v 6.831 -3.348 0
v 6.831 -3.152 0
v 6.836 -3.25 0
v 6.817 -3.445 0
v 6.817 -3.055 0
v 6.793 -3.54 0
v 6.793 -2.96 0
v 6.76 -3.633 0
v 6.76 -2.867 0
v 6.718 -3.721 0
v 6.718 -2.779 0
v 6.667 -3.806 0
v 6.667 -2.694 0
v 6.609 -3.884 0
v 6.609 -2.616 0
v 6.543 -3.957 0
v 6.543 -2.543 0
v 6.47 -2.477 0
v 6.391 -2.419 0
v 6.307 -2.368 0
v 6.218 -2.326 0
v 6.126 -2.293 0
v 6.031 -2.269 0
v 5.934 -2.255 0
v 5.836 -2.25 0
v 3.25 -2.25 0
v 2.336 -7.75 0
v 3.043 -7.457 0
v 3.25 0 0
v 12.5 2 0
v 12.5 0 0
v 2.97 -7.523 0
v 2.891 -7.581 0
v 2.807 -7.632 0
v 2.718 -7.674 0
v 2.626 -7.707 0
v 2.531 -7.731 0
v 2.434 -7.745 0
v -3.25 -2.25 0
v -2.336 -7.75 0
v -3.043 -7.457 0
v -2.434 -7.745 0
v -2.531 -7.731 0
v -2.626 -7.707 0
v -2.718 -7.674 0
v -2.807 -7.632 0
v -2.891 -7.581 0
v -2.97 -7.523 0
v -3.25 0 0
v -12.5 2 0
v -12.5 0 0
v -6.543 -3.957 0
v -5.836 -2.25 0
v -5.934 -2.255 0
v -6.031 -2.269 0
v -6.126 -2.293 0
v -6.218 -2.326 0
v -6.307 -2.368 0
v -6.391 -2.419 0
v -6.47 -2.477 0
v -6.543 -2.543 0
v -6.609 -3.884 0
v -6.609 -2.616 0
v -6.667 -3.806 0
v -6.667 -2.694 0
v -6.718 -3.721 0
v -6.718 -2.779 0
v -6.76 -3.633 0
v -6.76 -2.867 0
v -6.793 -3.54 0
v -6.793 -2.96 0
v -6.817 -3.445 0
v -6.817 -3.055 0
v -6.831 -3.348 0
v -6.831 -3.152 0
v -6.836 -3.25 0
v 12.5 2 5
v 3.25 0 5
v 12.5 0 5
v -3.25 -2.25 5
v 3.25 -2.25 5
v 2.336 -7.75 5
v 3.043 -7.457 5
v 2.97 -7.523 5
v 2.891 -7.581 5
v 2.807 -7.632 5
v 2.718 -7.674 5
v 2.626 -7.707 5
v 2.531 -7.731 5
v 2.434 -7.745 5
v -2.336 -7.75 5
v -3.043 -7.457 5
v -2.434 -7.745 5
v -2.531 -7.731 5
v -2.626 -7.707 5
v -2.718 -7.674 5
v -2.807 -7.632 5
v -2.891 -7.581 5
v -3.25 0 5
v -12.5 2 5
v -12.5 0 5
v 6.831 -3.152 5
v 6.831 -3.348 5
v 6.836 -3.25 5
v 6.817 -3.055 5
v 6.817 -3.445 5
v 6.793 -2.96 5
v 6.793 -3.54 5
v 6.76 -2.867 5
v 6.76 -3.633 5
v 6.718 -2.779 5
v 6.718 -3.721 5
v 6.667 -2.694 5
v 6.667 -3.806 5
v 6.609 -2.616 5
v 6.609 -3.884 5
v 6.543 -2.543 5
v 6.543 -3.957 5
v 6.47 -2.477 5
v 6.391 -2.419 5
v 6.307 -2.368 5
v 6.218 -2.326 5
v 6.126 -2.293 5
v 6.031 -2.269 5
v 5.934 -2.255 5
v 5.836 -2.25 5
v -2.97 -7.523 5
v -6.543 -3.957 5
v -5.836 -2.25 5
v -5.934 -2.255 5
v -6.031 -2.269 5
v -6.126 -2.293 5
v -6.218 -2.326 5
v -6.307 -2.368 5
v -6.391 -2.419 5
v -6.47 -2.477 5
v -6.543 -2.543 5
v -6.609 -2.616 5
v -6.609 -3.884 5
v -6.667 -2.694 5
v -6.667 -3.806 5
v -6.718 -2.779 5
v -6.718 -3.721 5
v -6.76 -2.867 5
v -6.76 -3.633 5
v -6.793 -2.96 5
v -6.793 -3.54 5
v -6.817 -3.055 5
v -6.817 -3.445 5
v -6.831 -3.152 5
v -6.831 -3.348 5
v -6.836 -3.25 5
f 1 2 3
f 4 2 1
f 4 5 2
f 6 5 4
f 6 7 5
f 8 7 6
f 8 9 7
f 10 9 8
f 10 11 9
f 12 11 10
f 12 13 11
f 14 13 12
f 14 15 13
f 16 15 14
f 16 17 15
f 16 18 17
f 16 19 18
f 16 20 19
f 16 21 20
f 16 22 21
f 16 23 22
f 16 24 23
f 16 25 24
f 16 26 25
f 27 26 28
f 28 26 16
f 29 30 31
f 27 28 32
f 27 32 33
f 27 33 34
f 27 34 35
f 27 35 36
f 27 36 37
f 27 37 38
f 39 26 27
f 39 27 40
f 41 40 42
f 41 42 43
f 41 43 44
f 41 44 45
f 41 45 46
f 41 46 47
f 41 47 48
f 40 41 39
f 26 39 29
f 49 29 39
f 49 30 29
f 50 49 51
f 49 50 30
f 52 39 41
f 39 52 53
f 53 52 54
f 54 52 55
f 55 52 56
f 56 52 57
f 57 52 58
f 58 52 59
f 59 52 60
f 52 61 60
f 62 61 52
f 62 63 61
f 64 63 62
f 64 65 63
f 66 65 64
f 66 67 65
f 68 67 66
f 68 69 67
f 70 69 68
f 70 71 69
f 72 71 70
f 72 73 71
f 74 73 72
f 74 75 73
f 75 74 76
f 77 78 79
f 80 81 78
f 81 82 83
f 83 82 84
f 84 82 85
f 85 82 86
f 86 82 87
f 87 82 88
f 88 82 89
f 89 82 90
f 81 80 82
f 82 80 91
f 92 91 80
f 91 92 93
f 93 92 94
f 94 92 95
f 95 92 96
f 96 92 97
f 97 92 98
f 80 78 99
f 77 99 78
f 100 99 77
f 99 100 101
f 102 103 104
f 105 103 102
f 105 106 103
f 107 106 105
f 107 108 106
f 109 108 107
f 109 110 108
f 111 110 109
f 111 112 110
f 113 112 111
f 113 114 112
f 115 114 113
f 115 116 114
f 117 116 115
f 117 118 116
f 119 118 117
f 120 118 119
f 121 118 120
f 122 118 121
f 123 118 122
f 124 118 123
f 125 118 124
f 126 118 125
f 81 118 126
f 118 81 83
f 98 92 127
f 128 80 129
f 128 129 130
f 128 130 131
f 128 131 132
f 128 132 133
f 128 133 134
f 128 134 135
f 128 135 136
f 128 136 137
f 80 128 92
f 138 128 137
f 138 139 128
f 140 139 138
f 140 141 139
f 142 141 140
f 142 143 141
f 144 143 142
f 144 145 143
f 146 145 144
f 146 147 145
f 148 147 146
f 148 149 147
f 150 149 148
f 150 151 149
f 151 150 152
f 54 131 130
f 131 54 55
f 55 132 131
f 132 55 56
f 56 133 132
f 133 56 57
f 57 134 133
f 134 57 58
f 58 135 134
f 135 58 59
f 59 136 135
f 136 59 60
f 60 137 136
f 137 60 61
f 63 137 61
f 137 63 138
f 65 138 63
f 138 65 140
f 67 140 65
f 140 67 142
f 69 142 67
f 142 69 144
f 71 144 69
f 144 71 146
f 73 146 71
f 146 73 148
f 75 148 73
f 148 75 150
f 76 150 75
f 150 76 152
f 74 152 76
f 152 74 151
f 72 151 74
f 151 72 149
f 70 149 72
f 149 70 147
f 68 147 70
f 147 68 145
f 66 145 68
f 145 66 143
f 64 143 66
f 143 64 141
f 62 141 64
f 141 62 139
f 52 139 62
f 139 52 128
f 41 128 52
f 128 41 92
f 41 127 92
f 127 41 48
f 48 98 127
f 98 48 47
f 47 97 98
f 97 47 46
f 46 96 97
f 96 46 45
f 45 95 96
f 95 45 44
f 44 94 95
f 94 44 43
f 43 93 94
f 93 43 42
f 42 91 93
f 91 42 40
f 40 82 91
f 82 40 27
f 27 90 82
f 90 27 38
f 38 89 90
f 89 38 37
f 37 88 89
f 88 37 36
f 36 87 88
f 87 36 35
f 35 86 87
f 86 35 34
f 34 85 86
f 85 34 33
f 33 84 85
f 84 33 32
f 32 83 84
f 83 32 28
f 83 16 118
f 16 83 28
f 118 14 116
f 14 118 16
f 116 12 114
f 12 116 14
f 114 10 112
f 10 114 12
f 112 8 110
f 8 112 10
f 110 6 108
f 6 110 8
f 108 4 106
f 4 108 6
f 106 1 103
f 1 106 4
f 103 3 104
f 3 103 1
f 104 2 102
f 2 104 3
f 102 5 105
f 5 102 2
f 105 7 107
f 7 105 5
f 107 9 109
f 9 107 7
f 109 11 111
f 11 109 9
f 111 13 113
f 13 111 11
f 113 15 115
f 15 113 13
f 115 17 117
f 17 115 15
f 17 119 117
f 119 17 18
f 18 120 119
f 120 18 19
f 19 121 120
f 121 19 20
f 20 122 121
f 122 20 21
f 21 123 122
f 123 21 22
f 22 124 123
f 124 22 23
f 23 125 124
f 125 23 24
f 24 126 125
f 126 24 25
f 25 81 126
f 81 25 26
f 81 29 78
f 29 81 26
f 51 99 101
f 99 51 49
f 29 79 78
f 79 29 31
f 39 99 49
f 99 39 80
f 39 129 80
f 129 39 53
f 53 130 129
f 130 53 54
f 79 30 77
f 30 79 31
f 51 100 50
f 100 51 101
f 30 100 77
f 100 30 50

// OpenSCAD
// file: t-track.scad
function wSlot(type) =
  type == "25" ? 6.5 :
  undef;

function hSlot(type) =
  type == "25" ? 2.25 :
  undef;

function wChannel(type) =
  type == "25" ? [16.5, 5.5] :
  undef;

function hChannel(type) =
  type == "25" ? 5.5 :
  undef;

function rChannel(type) =
  type == "25" ? 1 :
  undef;

function wFrame(type) =
  type == "25" ? 25 :
  undef;

module Channel(type) {
  $fn = 64;
    sw = wSlot(type);
    sh = hSlot(type);
    cw = wChannel(type);
    ch = hChannel(type);
    r  = rChannel(type);

  translate([0, -sh]) {
    minkowski() {
      circle(r=1);
      offset(delta=-r) {
        polygon([
          [-cw[0]/2, 0],
          [ cw[0]/2, 0],
          [ cw[1]/2, -ch],
          [-cw[1]/2, -ch],
        ]);
      }
    }
    translate([-sw/2, 0])
      square([sw, sh]);
  }
}

Channel("25");
// main file
$fn = 64;

use <t-track.scad>

module Insert(r, l) {
  w1 = channel_w1;
  w2 = channel_w2;
  h = channel_h;
  linear_extrude(l) {
    minkowski() {
      circle(r=r);
      offset(delta=-r) {
        polygon([
          [-w1/2, -slot_h],
          [ w1/2, -slot_h],
          [ w2/2, -slot_h-h],
          [-w2/2, -slot_h-h],
        ]);
      }
    }
  }
  translate([-slot_w/2, -slot_h]) {
    cube([slot_w, slot_h, l]);
  }
}

len = 5;
linear_extrude(len) Channel("25");
translate([-25/2, 0]) cube([25, 2, len]);
